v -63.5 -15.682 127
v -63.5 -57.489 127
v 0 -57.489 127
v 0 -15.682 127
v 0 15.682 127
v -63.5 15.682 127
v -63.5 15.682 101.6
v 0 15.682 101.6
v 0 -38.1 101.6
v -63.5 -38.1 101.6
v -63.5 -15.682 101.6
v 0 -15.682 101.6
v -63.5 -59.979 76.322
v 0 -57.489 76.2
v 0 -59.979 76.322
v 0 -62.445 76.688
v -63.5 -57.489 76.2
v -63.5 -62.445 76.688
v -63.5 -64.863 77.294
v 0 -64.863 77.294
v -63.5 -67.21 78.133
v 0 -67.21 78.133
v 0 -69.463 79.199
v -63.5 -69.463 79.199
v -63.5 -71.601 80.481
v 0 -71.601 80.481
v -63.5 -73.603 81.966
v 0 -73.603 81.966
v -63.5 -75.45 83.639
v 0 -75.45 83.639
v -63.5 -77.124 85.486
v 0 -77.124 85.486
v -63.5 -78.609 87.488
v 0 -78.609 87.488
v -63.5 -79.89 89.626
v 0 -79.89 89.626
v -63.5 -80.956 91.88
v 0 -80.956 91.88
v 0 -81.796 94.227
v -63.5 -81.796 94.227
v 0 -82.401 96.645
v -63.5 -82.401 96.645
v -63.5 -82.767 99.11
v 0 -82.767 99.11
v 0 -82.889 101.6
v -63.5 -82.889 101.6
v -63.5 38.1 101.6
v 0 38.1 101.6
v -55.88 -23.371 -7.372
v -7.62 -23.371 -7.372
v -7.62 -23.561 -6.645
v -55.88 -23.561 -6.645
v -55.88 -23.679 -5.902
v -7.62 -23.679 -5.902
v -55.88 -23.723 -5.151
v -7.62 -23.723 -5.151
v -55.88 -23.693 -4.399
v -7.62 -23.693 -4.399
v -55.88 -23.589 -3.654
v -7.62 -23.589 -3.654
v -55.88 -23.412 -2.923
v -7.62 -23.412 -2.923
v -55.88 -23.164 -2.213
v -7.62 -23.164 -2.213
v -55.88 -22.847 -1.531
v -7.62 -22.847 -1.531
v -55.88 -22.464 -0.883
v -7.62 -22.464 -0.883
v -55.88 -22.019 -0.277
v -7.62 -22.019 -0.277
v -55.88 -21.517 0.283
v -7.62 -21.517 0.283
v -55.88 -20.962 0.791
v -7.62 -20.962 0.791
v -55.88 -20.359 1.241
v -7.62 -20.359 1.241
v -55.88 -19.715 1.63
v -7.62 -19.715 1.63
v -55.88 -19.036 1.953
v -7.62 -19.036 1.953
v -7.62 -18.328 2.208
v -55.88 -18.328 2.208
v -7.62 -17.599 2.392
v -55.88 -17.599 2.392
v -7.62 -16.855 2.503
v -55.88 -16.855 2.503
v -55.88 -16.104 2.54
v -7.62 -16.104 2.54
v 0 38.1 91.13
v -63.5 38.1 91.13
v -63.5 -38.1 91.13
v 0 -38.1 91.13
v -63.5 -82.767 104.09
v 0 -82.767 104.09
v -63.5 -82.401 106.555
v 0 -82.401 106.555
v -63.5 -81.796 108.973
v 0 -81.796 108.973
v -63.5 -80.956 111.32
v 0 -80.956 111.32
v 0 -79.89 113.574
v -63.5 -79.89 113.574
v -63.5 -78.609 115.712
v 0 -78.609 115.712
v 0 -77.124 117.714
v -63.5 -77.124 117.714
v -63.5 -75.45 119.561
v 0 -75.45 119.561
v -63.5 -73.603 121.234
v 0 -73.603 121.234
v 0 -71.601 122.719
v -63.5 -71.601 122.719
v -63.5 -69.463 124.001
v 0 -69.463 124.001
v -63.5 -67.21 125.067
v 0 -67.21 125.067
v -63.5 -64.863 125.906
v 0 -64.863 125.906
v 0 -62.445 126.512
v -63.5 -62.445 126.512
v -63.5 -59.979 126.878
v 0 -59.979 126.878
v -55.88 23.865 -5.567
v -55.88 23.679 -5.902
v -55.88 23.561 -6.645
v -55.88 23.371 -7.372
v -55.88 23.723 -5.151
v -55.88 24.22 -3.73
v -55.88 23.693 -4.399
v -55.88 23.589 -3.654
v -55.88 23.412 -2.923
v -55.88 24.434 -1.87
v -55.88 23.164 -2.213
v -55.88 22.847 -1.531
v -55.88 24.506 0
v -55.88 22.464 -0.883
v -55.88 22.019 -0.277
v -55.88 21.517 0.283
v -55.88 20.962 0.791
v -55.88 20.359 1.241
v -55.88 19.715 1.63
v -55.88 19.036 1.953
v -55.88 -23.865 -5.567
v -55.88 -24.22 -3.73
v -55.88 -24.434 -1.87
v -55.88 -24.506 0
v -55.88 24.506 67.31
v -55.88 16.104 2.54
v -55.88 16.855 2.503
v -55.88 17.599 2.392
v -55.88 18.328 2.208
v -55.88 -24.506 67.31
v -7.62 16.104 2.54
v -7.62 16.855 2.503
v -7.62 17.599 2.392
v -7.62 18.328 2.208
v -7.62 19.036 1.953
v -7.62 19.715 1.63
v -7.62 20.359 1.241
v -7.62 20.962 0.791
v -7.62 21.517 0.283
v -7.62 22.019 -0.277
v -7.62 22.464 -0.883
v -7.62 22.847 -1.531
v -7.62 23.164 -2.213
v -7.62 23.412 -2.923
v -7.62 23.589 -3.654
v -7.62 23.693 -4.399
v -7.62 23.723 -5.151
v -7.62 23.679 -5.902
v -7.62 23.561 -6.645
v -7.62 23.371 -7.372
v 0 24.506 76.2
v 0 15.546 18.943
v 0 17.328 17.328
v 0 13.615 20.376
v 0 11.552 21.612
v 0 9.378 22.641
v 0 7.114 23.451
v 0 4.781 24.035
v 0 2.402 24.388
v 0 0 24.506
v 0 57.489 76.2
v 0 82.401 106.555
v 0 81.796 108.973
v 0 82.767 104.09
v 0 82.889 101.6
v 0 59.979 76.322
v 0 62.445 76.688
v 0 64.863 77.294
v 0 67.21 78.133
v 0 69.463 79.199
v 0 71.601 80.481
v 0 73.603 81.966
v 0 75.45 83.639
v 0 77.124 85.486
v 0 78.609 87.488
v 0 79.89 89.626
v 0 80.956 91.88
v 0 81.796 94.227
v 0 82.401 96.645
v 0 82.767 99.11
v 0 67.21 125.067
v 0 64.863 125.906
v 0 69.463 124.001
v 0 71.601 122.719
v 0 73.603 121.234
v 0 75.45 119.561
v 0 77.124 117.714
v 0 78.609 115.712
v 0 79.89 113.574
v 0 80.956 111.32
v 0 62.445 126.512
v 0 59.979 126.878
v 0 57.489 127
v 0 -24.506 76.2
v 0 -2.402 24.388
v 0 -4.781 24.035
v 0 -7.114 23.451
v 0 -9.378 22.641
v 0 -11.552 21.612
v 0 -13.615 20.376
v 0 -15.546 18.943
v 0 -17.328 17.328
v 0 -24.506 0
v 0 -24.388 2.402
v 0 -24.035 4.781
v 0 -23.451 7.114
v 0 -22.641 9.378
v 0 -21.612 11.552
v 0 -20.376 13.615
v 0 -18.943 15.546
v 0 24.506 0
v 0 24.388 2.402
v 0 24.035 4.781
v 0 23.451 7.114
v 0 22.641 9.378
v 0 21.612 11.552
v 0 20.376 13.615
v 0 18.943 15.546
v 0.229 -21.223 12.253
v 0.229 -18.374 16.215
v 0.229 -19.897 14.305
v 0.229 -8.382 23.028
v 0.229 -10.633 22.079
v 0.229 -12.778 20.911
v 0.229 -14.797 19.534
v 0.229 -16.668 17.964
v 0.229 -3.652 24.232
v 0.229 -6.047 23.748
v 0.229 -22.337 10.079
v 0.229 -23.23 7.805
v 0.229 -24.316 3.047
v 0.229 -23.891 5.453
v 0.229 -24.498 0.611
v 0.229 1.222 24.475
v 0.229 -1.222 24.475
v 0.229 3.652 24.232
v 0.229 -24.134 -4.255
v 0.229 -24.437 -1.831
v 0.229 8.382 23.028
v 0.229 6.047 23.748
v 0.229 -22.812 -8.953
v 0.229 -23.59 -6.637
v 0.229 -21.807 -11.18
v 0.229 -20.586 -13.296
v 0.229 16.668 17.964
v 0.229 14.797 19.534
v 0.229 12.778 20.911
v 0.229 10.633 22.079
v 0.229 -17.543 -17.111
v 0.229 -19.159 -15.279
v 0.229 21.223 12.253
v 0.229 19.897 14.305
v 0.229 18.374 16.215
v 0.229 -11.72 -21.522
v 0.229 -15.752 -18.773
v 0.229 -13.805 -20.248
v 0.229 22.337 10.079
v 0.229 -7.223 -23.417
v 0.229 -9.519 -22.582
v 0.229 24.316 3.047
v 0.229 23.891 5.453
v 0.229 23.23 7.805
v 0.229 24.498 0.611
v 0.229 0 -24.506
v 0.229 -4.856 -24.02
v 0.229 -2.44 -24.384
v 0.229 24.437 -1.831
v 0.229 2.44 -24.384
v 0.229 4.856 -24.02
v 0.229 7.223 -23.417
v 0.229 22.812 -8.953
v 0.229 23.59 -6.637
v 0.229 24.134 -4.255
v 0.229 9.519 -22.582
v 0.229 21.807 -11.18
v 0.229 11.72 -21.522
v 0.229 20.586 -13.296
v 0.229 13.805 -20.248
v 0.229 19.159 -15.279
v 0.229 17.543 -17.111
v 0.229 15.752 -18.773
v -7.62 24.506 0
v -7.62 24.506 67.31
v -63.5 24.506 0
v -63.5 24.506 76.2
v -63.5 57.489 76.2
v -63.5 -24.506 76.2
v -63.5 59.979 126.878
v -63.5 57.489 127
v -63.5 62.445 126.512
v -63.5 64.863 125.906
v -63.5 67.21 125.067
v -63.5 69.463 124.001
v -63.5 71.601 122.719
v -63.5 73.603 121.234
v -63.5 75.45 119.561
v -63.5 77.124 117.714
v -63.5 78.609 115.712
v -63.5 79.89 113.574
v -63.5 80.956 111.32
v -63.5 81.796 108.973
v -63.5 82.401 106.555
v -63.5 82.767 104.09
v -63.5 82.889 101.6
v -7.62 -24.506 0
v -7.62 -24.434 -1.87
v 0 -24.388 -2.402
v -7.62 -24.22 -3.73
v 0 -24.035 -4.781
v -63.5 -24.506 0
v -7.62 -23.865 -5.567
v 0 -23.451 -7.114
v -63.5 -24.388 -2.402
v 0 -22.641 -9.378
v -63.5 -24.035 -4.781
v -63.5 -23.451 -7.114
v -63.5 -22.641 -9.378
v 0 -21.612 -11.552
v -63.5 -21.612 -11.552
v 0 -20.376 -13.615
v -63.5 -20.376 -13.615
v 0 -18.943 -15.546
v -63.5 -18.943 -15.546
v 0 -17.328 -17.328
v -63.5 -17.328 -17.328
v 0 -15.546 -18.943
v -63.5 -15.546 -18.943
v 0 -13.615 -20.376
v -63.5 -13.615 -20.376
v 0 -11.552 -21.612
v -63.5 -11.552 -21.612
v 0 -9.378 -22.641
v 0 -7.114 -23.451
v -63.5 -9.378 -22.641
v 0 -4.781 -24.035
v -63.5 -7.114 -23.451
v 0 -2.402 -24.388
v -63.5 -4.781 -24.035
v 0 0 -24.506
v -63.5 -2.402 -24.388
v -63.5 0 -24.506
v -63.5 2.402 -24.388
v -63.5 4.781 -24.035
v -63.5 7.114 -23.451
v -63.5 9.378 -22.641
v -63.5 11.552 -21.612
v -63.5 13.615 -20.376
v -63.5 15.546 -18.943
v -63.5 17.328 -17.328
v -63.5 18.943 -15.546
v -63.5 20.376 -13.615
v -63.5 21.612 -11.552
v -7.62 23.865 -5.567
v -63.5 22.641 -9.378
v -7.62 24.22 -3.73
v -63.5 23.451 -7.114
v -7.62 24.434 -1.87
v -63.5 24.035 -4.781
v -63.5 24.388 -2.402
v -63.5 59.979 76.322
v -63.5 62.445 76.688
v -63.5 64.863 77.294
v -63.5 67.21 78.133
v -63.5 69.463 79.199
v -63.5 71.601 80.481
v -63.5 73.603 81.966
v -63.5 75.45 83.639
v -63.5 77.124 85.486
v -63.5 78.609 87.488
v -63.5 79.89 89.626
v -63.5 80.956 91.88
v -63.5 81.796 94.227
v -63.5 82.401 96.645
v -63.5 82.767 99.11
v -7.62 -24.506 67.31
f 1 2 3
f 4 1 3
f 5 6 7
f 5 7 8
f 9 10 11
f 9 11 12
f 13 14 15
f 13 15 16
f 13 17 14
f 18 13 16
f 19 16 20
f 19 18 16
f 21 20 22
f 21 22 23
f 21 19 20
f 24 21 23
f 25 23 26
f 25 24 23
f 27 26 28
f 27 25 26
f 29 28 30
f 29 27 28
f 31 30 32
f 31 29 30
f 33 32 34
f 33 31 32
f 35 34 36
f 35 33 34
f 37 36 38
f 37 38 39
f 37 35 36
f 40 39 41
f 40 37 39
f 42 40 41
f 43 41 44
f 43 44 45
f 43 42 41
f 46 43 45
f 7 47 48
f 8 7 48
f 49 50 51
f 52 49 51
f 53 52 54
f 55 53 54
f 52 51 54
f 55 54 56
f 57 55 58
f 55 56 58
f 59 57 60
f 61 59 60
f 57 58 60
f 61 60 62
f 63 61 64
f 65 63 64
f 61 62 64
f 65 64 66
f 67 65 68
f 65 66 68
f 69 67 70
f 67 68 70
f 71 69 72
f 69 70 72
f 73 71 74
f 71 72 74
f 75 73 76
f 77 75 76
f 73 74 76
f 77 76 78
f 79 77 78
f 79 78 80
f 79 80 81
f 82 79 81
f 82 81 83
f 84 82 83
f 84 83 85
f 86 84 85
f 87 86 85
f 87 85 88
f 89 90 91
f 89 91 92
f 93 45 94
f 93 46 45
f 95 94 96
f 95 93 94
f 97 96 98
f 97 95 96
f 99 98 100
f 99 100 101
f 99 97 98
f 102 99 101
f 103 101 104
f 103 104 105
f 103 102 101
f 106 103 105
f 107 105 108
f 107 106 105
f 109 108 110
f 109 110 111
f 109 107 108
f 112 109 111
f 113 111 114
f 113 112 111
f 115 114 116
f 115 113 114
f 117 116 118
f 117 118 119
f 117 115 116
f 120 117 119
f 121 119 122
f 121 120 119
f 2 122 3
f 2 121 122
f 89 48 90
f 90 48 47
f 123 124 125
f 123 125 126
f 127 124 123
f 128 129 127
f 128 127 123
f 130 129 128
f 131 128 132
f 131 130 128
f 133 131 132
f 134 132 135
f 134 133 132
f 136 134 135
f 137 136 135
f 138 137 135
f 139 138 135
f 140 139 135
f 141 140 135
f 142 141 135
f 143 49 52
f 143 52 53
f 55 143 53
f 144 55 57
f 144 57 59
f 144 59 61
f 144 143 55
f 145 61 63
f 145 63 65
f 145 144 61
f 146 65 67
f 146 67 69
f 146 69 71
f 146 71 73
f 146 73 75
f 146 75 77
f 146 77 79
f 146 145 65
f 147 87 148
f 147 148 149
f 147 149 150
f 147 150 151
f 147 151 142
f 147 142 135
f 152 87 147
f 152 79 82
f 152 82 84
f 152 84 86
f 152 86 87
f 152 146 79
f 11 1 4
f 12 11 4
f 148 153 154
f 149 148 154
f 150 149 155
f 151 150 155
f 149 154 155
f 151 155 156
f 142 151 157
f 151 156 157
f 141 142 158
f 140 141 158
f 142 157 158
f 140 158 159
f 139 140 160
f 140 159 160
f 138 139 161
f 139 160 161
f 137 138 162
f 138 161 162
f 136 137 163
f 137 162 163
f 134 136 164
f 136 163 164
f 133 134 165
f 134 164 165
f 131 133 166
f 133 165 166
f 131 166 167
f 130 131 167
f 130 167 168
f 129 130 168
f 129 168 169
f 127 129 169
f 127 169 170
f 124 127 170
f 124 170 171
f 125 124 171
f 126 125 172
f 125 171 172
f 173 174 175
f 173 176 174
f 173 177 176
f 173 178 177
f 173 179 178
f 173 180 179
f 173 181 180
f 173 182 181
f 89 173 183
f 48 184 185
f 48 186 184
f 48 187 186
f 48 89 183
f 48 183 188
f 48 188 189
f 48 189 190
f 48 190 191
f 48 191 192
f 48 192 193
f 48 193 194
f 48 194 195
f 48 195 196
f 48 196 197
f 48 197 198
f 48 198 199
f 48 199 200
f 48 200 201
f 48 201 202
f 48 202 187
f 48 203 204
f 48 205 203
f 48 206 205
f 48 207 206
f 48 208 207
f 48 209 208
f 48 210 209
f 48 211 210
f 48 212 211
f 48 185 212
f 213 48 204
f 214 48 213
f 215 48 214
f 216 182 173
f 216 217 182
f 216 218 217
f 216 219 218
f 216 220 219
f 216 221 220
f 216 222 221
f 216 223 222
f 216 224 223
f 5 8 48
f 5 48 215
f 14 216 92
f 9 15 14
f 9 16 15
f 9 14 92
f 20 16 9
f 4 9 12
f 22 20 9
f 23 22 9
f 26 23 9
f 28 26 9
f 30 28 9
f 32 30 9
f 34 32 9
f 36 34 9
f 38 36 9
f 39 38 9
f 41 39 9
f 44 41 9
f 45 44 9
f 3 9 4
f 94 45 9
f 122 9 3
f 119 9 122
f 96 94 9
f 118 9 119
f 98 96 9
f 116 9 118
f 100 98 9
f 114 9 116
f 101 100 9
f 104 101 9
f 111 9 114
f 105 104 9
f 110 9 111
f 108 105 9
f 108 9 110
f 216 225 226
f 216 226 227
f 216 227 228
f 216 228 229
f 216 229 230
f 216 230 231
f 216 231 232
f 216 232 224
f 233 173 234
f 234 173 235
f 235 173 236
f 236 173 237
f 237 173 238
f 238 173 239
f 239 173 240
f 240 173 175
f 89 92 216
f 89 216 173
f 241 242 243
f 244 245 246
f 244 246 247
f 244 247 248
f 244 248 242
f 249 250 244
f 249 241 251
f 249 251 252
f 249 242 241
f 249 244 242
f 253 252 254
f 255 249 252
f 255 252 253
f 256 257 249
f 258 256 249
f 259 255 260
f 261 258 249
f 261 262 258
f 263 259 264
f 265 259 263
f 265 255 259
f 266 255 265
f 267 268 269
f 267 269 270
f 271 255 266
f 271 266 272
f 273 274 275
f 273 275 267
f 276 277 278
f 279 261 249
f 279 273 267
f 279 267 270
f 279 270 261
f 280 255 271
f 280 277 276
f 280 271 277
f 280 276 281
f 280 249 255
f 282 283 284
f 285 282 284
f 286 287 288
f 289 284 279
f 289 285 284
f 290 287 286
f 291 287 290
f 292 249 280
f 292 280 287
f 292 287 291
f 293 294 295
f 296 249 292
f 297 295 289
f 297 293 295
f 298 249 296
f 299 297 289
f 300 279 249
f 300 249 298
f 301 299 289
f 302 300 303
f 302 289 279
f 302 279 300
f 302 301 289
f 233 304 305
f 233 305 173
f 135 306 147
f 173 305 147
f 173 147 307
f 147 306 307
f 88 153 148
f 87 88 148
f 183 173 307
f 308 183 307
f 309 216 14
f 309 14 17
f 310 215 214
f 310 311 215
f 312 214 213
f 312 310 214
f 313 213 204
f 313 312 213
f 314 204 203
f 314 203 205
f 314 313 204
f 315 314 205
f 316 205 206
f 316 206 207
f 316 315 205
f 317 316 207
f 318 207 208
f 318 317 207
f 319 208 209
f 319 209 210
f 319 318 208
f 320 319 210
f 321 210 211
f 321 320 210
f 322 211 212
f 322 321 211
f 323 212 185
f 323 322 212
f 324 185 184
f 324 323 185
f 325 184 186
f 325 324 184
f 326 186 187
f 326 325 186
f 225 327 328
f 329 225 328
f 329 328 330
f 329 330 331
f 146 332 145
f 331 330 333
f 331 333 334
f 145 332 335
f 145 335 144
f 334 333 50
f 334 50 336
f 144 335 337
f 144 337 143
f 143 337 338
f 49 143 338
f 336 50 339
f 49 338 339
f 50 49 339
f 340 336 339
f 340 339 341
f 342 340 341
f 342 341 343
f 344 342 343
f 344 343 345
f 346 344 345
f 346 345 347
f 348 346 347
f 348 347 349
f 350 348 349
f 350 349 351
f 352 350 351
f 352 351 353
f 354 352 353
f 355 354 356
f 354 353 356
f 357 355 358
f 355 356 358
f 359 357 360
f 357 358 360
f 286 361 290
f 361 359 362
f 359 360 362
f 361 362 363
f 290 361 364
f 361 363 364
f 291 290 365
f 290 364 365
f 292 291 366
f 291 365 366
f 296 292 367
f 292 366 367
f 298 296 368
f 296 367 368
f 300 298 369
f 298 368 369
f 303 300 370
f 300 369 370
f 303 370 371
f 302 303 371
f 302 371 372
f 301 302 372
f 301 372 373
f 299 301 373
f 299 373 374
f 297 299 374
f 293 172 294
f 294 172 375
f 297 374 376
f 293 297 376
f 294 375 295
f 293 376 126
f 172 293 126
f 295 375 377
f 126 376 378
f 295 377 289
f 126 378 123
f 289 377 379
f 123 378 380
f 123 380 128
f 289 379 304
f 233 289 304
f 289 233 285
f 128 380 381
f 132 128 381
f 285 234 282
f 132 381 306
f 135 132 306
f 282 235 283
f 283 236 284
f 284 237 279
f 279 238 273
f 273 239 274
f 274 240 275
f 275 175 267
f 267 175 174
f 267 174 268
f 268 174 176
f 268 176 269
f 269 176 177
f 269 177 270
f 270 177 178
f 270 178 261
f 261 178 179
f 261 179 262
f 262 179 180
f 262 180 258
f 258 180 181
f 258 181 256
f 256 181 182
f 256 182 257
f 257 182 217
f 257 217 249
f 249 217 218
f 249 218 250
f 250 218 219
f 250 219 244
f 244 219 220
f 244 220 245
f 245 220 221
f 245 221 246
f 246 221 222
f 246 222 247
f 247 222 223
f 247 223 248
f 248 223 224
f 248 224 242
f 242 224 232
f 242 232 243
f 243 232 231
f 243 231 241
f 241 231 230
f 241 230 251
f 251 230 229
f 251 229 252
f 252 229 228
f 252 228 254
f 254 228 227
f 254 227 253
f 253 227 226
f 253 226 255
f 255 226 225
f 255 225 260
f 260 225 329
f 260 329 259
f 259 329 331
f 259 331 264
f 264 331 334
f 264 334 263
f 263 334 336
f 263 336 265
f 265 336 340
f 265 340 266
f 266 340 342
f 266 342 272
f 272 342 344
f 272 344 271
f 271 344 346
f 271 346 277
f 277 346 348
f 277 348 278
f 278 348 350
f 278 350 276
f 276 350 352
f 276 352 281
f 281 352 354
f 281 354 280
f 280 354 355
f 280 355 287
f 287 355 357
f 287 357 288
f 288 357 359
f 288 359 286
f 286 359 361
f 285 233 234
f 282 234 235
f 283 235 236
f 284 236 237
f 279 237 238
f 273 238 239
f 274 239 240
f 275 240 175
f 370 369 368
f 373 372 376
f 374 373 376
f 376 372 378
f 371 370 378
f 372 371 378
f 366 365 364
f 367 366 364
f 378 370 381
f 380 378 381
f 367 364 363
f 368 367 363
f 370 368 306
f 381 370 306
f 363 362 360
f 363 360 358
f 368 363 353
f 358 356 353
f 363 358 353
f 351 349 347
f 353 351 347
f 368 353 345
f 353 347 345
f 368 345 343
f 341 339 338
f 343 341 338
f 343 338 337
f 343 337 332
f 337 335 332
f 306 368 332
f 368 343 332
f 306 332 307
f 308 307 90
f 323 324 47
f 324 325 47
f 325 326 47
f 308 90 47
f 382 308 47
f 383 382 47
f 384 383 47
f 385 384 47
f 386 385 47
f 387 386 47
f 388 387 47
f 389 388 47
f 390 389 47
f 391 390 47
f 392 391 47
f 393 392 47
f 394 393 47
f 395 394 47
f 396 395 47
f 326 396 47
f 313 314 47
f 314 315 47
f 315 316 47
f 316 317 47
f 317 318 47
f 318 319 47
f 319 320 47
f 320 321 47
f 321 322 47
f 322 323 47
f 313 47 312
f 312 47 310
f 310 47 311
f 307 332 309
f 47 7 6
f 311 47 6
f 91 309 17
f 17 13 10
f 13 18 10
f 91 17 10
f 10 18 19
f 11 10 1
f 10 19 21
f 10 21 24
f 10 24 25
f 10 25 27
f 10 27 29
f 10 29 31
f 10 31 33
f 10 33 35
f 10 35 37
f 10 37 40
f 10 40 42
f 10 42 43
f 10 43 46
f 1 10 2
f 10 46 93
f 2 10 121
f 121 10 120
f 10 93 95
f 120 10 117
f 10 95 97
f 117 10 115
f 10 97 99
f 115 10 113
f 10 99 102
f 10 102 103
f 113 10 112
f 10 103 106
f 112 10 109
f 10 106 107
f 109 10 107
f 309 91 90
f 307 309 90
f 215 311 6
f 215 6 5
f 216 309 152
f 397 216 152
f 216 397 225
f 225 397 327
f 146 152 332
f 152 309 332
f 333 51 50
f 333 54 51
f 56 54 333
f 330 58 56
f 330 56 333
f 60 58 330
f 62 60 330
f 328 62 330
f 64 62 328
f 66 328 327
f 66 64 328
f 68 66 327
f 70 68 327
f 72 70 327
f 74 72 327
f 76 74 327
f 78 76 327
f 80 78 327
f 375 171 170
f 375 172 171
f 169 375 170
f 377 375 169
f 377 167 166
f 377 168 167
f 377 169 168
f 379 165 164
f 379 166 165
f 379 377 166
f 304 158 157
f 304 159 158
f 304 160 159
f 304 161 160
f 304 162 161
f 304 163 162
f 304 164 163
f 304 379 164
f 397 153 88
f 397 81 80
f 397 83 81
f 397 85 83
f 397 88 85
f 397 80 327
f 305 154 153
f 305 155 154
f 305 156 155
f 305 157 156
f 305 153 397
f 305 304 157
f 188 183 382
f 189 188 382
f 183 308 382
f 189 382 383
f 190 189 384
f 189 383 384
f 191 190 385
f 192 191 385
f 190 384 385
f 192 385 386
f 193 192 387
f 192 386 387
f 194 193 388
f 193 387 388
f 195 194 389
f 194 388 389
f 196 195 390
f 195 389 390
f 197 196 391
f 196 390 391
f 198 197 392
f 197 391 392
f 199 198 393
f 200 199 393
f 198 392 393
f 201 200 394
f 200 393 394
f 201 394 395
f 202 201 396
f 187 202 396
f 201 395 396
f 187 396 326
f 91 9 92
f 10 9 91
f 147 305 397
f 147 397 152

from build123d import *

# Parameters (mm, degrees)
SKETCH1_R            = 24.505905818
BOSS_EXTRUDE1_DEPTH  = 0.2286
BOSS_EXTRUDE2_START  = 63.5
BOSS_EXTRUDE2_DEPTH  = 63.5
SKETCH4_W            = 63.5
SKETCH4_H            = 76.2
BOSS_EXTRUDE4_DEPTH  = 14.929782549
SKETCH5_W            = 63.5
SKETCH5_H            = 50.8
BOSS_EXTRUDE5_DEPTH  = 44.789347647
FILLET2_R            = 25.4
SKETCH7_W            = 63.5
SKETCH7_H            = 25.4
BOSS_EXTRUDE7_DEPTH  = 22.41804
FILLET2_OF_MIRROR1_R = 25.4
SKETCH10_W           = 48.26
SKETCH10_H           = 64.77
CUT_EXTRUDE2_DEPTH   = 179.030869421
FILLET3_R            = 7.62


# Some blends are built 0.0001 mm under size
with BuildPart() as part:
    # Sketch1 → Boss-Extrude1 (new body)
    with BuildSketch(Plane.YZ):
        with Locations(Location((0, 0, 0), (0, 0, 270))):
            Circle(SKETCH1_R)
    extrude(amount=BOSS_EXTRUDE1_DEPTH)

    # Sketch2 → Boss-Extrude2 (add)
    with BuildSketch(Plane(origin=(0, 0, 0), x_dir=(0, -1, 0), z_dir=(-1, 0, 0)).offset(BOSS_EXTRUDE2_START)):
        with BuildLine():
            Line((-24.505905818, 0), (-24.505905818, 76.2))
            Line((-24.505905818, 76.2), (24.505905818, 76.2))
            Line((24.505905818, 76.2), (24.505905818, 0))
            ThreePointArc((24.505905818, 0), (0, -24.505905818), (-24.505905818, 0))
        make_face()
    extrude(amount=-BOSS_EXTRUDE2_DEPTH)

    # Sketch4 → Boss-Extrude4 (add)
    with BuildSketch(Plane.XY.offset(76.2)):
        with Locations((-31.75, 0)):
            Rectangle(SKETCH4_W, SKETCH4_H)
    extrude(amount=BOSS_EXTRUDE4_DEPTH)

    # Sketch5 → Boss-Extrude5 (add)
    with BuildSketch(Plane(origin=(0, 38.1, 0), x_dir=(-1, 0, 0), z_dir=(0, 1, 0))):
        with Locations((31.75, 101.6)):
            Rectangle(SKETCH5_W, SKETCH5_H)
    boss_extrude5 = extrude(amount=BOSS_EXTRUDE5_DEPTH)

    # Fillet2
    fillet2_edges = [part.edges().sort_by_distance(p)[0] for p in [
        (-31.75, 82.889347647, 76.2),
        (-31.75, 82.889347647, 127),
    ]]
    fillet(fillet2_edges, radius=FILLET2_R - 0.0001)  # a hair under: the kernel refuses the full size

    # Sketch7 → Boss-Extrude7 (add)
    with BuildSketch(Plane.XZ.offset(-38.1)):
        with Locations((-31.75, 114.3)):
            Rectangle(SKETCH7_W, SKETCH7_H)
    boss_extrude7 = extrude(amount=BOSS_EXTRUDE7_DEPTH)

    # Mirror1: Boss-Extrude5, Boss-Extrude7 across plane
    add(boss_extrude5.mirror(Plane.ZX))
    add(boss_extrude7.mirror(Plane.ZX))

    # Fillet2 of Mirror1
    fillet2_of_mirror1_edges = [part.edges().sort_by_distance(p)[0] for p in [
        (-31.75, -82.889347647, 76.2),
        (-31.75, -82.889347647, 127),
    ]]
    fillet(fillet2_of_mirror1_edges, radius=FILLET2_OF_MIRROR1_R - 0.0001)  # a hair under: the kernel refuses the full size

    # Sketch10 → Cut-Extrude2 (cut, through all)
    with BuildSketch(Plane(origin=(0, 24.505905818, 0), x_dir=(-1, 0, 0), z_dir=(0, 1, 0))):
        with Locations((31.75, 34.925)):
            Rectangle(SKETCH10_W, SKETCH10_H)
    extrude(amount=-CUT_EXTRUDE2_DEPTH, mode=Mode.SUBTRACT)

    # Fillet3
    # the kernel refuses this fillet: 7.62 mm, written as the material it takes off along each edge
    with BuildSketch(Plane(origin=(-7.62, -24.505905818, 2.54), x_dir=(0, 0.11378574923272014, -0.9935053111441069), z_dir=(-1, 0, 0))) as fillet3_piece_1:
        with BuildLine():
            CenterArc((8.526567897, -7.480642321), FILLET3_R, 79.025374556, 107.50821933)
            Line((0.956057426, -8.34768973), (0.199006379, -8.434394471))
            Line((0.199006379, -8.434394471), (-0.757051047, -0.086704741))
            Line((-0.757051047, -0.086704741), (-0.086704741, 0.757051047))
            ThreePointArc((-0.086704741, 0.757051047), (2.436798749, 1.04606685), (10.122284809, 0.748064232))
            Line((10.122284809, 0.748064232), (9.977219635, 0))
        make_face()
    extrude(amount=48.26, mode=Mode.SUBTRACT)
    with BuildSketch(Plane(origin=(-7.62, 24.505905818, 2.54), x_dir=(0, -0.11378574923272022, -0.9935053111441069), z_dir=(-1, 0, 0))) as fillet3_piece_2:
        with BuildLine():
            CenterArc((8.526567897, 7.480642321), FILLET3_R, 173.466406113, 107.50821933)
            Line((0.956057426, 8.34768973), (0.199006379, 8.434394471))
            Line((0.199006379, 8.434394471), (-0.757051047, 0.086704741))
            Line((-0.757051047, 0.086704741), (-0.086704741, -0.757051047))
            ThreePointArc((-0.086704741, -0.757051047), (2.436798749, -1.04606685), (10.122284809, -0.748064232))
            Line((10.122284809, -0.748064232), (9.977219635, 0))
        make_face()
    extrude(amount=48.26, mode=Mode.SUBTRACT)


solid = part.part
